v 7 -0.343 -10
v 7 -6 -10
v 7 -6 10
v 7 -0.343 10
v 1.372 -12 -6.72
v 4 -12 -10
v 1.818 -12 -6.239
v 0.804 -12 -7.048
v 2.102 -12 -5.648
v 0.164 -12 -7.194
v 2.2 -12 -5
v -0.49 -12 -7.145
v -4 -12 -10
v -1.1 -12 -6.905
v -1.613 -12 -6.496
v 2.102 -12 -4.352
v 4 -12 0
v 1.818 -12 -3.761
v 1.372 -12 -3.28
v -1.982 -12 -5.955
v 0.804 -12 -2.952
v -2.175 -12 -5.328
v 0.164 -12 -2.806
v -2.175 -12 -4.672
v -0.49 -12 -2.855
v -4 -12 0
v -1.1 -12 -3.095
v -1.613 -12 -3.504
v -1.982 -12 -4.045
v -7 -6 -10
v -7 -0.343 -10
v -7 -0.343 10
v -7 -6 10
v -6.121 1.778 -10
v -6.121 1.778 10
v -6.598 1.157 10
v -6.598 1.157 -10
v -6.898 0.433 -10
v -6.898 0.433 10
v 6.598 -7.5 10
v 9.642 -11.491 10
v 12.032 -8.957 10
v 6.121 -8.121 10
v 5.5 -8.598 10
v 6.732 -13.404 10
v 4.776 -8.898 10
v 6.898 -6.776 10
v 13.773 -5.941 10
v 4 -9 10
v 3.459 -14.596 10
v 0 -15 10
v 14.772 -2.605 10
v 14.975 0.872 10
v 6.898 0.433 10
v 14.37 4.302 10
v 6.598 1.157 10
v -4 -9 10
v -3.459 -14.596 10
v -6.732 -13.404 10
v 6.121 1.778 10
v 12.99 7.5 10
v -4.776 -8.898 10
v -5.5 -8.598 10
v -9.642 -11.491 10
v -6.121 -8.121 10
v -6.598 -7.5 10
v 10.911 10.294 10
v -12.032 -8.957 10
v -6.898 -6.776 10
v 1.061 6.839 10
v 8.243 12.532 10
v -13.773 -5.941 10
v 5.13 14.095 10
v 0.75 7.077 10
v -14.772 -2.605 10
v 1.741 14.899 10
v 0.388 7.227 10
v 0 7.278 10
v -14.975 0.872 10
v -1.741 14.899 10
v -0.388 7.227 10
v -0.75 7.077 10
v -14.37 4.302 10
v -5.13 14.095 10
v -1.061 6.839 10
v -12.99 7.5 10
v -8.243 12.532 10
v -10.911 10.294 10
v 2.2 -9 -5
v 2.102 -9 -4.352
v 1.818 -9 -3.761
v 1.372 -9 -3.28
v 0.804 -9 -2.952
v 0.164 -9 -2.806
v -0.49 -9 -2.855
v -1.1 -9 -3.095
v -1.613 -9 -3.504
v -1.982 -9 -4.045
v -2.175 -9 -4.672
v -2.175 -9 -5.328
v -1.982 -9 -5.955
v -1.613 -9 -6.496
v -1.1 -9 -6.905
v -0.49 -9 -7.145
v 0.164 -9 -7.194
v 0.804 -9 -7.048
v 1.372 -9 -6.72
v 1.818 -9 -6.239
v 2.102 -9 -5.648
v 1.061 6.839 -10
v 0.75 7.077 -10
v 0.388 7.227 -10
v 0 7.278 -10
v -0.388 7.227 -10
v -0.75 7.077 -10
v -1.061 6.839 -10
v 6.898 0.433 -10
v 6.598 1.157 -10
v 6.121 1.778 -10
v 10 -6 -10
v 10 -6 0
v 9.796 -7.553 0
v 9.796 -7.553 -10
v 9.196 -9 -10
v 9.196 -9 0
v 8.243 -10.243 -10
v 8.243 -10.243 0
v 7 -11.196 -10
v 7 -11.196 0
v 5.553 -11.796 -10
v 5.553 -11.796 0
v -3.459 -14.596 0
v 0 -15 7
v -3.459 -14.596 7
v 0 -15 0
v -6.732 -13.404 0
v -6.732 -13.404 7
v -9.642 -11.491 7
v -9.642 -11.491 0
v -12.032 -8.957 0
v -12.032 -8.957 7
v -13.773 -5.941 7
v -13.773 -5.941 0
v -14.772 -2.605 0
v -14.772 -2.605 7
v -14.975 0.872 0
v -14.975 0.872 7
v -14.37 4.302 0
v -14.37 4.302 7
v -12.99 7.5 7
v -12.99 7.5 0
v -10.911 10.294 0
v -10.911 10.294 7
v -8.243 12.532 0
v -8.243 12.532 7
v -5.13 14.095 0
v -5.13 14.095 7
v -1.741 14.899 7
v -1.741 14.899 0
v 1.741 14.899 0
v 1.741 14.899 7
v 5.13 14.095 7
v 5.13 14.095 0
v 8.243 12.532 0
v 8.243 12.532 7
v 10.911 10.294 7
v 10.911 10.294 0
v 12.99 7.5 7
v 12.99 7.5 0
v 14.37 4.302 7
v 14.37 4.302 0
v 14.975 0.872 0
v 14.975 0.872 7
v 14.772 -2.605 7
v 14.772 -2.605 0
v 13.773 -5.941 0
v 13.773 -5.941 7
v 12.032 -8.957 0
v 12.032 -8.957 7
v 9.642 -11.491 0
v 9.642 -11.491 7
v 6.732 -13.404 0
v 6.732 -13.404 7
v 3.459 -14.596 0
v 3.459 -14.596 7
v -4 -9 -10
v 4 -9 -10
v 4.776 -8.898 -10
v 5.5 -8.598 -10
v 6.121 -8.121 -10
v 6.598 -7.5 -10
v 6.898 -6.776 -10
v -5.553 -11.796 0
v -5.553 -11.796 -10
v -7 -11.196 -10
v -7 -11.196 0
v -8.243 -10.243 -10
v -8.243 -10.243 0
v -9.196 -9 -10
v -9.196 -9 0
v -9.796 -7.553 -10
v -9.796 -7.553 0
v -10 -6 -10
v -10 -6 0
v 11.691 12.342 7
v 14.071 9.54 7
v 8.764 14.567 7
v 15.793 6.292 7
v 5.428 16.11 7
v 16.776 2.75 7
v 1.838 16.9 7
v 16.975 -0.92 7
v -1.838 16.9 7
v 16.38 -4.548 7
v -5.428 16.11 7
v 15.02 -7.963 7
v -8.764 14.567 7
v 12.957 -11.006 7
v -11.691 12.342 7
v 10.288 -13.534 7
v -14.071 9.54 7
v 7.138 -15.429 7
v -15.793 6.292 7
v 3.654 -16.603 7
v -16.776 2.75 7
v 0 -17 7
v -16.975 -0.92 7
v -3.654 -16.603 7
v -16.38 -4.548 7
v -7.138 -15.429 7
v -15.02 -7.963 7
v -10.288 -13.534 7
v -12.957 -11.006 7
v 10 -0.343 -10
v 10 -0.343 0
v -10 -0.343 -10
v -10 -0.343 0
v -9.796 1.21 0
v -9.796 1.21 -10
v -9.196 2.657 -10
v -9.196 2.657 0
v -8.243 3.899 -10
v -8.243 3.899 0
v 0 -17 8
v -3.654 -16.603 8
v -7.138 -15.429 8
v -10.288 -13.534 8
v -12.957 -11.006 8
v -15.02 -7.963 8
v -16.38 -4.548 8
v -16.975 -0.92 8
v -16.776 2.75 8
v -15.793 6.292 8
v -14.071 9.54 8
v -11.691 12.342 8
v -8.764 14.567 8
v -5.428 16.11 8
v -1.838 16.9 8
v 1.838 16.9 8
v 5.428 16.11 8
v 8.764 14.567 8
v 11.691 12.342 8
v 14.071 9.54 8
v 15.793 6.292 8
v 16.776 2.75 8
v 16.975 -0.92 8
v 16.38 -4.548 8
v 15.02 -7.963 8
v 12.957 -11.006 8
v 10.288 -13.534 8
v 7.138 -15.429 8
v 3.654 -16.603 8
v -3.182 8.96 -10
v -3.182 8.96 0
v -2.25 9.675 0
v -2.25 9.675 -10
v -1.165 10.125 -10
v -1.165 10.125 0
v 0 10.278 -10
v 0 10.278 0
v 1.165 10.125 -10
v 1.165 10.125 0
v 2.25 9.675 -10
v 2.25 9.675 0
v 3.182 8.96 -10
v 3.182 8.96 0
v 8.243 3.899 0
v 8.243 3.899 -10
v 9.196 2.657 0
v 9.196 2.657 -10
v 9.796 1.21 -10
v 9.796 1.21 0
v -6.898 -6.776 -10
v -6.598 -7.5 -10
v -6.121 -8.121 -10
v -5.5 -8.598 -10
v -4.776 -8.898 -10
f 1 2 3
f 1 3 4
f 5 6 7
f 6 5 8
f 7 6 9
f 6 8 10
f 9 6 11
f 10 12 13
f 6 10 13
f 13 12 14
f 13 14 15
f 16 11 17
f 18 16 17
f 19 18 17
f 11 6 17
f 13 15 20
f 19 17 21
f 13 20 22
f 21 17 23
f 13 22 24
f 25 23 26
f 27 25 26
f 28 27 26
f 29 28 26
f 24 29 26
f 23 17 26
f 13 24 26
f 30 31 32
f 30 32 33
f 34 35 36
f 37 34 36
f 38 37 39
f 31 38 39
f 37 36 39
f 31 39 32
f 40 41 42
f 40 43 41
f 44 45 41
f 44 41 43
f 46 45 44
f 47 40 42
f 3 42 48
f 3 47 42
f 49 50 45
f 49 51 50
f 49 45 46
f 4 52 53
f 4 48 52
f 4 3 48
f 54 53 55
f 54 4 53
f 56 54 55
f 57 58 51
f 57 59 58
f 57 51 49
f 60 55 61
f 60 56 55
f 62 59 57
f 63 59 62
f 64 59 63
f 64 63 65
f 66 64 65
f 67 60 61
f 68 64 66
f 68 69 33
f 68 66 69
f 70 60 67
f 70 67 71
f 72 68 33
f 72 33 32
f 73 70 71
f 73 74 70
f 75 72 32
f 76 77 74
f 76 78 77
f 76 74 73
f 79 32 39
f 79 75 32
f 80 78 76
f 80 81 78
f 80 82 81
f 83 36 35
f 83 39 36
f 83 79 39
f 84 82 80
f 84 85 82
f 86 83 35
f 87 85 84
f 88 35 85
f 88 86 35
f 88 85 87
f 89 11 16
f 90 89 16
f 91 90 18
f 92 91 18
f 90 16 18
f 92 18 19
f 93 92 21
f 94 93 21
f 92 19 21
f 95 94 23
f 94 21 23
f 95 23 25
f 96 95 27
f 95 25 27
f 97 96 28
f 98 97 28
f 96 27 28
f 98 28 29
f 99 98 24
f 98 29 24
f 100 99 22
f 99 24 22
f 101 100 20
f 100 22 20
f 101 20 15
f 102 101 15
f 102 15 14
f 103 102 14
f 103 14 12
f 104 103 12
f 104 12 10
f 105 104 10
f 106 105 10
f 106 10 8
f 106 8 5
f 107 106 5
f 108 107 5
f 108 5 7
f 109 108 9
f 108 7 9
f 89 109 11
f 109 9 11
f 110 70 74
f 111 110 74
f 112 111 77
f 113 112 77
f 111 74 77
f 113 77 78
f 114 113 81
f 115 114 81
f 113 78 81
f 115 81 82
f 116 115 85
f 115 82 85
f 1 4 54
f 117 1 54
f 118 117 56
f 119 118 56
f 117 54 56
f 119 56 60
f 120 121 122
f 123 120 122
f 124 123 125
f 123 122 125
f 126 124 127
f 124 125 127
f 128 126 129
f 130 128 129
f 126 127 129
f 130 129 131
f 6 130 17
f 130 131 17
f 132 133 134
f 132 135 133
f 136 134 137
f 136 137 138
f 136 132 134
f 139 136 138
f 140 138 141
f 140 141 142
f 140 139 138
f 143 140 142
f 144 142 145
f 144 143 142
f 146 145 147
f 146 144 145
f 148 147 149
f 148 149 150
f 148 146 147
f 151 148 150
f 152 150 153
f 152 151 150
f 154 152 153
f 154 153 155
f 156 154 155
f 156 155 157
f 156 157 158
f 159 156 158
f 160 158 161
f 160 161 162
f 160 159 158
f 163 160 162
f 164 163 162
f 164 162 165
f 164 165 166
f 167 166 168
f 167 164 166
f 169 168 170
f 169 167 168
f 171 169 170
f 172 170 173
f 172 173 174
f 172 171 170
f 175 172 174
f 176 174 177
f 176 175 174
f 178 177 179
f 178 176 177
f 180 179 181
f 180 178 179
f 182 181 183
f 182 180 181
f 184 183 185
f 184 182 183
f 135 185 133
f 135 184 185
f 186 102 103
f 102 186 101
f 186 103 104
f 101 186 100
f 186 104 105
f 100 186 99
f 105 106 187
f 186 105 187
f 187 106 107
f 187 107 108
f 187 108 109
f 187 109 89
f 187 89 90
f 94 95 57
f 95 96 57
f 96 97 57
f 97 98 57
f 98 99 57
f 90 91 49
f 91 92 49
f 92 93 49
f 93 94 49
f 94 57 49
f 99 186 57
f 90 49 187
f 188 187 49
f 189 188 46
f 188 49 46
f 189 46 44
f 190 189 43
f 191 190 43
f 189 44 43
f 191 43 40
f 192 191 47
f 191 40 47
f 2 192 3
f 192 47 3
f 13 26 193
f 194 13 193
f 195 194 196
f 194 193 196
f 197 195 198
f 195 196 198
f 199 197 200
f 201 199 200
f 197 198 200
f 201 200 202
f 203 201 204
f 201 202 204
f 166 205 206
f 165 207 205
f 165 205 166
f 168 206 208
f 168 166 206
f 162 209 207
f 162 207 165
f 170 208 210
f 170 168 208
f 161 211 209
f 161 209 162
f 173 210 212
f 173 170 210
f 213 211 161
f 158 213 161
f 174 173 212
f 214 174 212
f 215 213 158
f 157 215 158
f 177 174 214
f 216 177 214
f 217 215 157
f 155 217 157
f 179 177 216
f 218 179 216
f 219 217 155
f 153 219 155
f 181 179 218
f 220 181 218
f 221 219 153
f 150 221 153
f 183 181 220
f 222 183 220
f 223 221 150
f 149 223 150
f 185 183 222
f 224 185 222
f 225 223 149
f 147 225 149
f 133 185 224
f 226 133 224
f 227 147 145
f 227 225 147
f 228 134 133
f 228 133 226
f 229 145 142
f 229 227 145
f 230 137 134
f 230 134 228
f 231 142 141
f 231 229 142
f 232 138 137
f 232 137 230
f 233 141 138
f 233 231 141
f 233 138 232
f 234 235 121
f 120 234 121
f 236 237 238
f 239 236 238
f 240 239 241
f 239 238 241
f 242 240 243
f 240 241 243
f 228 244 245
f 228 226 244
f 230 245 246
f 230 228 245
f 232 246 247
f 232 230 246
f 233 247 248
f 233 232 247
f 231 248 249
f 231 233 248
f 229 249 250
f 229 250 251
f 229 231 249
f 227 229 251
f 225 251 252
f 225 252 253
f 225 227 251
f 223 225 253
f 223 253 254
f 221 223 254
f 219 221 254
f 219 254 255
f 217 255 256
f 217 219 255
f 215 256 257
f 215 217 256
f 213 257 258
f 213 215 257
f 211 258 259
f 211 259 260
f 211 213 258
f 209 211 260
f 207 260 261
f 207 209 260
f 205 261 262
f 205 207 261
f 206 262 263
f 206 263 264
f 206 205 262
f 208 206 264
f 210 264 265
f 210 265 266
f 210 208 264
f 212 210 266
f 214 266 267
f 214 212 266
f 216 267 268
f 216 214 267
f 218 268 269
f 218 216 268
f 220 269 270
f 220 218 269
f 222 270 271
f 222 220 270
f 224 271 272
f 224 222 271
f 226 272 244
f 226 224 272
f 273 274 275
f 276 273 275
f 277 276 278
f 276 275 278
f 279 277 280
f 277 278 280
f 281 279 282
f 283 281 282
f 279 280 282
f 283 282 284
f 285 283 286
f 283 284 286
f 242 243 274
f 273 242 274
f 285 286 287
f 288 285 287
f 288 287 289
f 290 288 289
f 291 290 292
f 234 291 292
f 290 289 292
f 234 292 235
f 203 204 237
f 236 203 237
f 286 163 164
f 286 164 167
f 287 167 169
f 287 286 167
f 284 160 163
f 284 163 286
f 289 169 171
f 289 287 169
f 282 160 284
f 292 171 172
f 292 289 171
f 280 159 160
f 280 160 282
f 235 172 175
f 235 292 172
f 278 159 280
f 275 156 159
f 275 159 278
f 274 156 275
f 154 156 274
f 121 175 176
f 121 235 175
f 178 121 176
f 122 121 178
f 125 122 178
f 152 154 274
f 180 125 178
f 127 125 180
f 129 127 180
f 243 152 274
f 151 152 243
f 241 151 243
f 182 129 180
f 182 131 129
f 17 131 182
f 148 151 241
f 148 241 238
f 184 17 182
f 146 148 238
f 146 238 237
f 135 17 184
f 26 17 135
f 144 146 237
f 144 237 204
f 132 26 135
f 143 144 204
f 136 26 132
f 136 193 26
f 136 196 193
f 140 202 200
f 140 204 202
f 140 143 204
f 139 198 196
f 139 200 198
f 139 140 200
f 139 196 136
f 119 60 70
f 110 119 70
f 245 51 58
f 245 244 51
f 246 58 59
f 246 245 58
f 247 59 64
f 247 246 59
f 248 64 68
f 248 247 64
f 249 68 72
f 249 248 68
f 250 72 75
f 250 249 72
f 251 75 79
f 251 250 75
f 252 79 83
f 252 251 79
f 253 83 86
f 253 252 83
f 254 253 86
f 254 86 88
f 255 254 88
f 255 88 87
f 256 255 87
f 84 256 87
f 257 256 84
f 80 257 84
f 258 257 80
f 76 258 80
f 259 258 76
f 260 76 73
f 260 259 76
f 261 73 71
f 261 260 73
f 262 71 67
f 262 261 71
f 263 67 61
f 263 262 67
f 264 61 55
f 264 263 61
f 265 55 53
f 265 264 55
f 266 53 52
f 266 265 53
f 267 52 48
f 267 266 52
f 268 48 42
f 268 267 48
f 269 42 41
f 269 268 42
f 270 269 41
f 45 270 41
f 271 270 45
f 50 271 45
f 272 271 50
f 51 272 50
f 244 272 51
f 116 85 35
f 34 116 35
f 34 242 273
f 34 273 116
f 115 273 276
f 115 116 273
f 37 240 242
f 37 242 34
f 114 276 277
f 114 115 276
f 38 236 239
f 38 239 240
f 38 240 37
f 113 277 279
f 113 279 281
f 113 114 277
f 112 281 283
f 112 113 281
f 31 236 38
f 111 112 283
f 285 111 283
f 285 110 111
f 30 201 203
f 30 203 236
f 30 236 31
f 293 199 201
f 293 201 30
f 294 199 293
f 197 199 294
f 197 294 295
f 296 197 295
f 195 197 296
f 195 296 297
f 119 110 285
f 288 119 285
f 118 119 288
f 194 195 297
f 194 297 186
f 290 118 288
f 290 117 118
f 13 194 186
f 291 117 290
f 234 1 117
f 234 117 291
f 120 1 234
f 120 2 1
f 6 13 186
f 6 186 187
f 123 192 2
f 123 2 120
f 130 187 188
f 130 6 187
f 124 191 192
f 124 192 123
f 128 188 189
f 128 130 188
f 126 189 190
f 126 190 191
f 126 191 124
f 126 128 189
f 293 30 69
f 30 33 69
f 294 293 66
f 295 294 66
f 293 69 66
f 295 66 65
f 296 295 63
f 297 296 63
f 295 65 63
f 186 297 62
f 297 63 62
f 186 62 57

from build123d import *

# Parameters (mm, degrees)
F3_DEPTH = 10.001
F5_DEPTH = 10
F6_R     = 2.2
F7_DEPTH = 3


with BuildPart() as f1:
    # F0 (on Right) → F1 (revolve)
    with BuildSketch(Plane.YZ):
        Polygon((-15, 0), (0, 0), (0, 10), (-15, 10), (-17, 8), (-17, 7), (-15, 7), align=None)
    revolve(axis=Axis((0, 0, -2.15537), (0, 0, -1)))

    # F2 (on face) → F3 (cut, through all)
    with BuildSketch(Plane.XY.offset(10)):
        with BuildLine():
            Line((-7, -0.343146), (-7, -6))
            ThreePointArc((-7, -6), (-6.12132, -8.12132), (-4, -9))
            Line((-4, -9), (4, -9))
            ThreePointArc((4, -9), (6.12132, -8.12132), (7, -6))
            Line((7, -6), (7, -0.343146))
            ThreePointArc((7, -0.343146), (6.771639, 0.804905), (6.12132, 1.778175))
            Line((6.12132, 1.778175), (1.06066, 6.838835))
            ThreePointArc((1.06066, 6.838835), (0, 7.278175), (-1.06066, 6.838835))
            Line((-1.06066, 6.838835), (-6.12132, 1.778175))
            ThreePointArc((-6.12132, 1.778175), (-6.771639, 0.804905), (-7, -0.343146))
        make_face()
    extrude(amount=-F3_DEPTH, mode=Mode.SUBTRACT)

    # F4 (on face) → F5 (join)
    with BuildSketch(Plane(origin=(0, 0, 0), x_dir=(1, 0, 0), z_dir=(0, 0, -1))):
        with BuildLine():
            Line((4, 12), (-4, 12))
            ThreePointArc((-4, 12), (-8.242641, 10.242641), (-10, 6))
            Line((-10, 6), (-10, 0.343146))
            ThreePointArc((-10, 0.343146), (-9.543277, -1.952955), (-8.242641, -3.899495))
            Line((-8.242641, -3.899495), (-3.181981, -8.960155))
            ThreePointArc((-3.181981, -8.960155), (0, -10.278175), (3.181981, -8.960155))
            Line((3.181981, -8.960155), (8.242641, -3.899495))
            ThreePointArc((8.242641, -3.899495), (9.543277, -1.952955), (10, 0.343146))
            Line((10, 0.343146), (10, 6))
            ThreePointArc((10, 6), (8.242641, 10.242641), (4, 12))
        make_face()
        with BuildLine():
            ThreePointArc((-7, 6), (-6.12132, 8.12132), (-4, 9))
            Line((-4, 9), (4, 9))
            ThreePointArc((4, 9), (6.12132, 8.12132), (7, 6))
            Line((7, 6), (7, 0.343146))
            ThreePointArc((7, 0.343146), (6.771639, -0.804905), (6.12132, -1.778175))
            Line((6.12132, -1.778175), (1.06066, -6.838835))
            ThreePointArc((1.06066, -6.838835), (0, -7.278175), (-1.06066, -6.838835))
            Line((-1.06066, -6.838835), (-6.12132, -1.778175))
            ThreePointArc((-6.12132, -1.778175), (-6.771639, -0.804905), (-7, 0.343146))
            Line((-7, 0.343146), (-7, 6))
        make_face(mode=Mode.SUBTRACT)
    extrude(amount=F5_DEPTH)

    # F6 (on face) → F7 (cut, through all)
    with BuildSketch(Plane.XZ.offset(12)):
        with Locations((0, -5)):
            Circle(F6_R)
    extrude(amount=-F7_DEPTH, mode=Mode.SUBTRACT)


solid = f1.part
